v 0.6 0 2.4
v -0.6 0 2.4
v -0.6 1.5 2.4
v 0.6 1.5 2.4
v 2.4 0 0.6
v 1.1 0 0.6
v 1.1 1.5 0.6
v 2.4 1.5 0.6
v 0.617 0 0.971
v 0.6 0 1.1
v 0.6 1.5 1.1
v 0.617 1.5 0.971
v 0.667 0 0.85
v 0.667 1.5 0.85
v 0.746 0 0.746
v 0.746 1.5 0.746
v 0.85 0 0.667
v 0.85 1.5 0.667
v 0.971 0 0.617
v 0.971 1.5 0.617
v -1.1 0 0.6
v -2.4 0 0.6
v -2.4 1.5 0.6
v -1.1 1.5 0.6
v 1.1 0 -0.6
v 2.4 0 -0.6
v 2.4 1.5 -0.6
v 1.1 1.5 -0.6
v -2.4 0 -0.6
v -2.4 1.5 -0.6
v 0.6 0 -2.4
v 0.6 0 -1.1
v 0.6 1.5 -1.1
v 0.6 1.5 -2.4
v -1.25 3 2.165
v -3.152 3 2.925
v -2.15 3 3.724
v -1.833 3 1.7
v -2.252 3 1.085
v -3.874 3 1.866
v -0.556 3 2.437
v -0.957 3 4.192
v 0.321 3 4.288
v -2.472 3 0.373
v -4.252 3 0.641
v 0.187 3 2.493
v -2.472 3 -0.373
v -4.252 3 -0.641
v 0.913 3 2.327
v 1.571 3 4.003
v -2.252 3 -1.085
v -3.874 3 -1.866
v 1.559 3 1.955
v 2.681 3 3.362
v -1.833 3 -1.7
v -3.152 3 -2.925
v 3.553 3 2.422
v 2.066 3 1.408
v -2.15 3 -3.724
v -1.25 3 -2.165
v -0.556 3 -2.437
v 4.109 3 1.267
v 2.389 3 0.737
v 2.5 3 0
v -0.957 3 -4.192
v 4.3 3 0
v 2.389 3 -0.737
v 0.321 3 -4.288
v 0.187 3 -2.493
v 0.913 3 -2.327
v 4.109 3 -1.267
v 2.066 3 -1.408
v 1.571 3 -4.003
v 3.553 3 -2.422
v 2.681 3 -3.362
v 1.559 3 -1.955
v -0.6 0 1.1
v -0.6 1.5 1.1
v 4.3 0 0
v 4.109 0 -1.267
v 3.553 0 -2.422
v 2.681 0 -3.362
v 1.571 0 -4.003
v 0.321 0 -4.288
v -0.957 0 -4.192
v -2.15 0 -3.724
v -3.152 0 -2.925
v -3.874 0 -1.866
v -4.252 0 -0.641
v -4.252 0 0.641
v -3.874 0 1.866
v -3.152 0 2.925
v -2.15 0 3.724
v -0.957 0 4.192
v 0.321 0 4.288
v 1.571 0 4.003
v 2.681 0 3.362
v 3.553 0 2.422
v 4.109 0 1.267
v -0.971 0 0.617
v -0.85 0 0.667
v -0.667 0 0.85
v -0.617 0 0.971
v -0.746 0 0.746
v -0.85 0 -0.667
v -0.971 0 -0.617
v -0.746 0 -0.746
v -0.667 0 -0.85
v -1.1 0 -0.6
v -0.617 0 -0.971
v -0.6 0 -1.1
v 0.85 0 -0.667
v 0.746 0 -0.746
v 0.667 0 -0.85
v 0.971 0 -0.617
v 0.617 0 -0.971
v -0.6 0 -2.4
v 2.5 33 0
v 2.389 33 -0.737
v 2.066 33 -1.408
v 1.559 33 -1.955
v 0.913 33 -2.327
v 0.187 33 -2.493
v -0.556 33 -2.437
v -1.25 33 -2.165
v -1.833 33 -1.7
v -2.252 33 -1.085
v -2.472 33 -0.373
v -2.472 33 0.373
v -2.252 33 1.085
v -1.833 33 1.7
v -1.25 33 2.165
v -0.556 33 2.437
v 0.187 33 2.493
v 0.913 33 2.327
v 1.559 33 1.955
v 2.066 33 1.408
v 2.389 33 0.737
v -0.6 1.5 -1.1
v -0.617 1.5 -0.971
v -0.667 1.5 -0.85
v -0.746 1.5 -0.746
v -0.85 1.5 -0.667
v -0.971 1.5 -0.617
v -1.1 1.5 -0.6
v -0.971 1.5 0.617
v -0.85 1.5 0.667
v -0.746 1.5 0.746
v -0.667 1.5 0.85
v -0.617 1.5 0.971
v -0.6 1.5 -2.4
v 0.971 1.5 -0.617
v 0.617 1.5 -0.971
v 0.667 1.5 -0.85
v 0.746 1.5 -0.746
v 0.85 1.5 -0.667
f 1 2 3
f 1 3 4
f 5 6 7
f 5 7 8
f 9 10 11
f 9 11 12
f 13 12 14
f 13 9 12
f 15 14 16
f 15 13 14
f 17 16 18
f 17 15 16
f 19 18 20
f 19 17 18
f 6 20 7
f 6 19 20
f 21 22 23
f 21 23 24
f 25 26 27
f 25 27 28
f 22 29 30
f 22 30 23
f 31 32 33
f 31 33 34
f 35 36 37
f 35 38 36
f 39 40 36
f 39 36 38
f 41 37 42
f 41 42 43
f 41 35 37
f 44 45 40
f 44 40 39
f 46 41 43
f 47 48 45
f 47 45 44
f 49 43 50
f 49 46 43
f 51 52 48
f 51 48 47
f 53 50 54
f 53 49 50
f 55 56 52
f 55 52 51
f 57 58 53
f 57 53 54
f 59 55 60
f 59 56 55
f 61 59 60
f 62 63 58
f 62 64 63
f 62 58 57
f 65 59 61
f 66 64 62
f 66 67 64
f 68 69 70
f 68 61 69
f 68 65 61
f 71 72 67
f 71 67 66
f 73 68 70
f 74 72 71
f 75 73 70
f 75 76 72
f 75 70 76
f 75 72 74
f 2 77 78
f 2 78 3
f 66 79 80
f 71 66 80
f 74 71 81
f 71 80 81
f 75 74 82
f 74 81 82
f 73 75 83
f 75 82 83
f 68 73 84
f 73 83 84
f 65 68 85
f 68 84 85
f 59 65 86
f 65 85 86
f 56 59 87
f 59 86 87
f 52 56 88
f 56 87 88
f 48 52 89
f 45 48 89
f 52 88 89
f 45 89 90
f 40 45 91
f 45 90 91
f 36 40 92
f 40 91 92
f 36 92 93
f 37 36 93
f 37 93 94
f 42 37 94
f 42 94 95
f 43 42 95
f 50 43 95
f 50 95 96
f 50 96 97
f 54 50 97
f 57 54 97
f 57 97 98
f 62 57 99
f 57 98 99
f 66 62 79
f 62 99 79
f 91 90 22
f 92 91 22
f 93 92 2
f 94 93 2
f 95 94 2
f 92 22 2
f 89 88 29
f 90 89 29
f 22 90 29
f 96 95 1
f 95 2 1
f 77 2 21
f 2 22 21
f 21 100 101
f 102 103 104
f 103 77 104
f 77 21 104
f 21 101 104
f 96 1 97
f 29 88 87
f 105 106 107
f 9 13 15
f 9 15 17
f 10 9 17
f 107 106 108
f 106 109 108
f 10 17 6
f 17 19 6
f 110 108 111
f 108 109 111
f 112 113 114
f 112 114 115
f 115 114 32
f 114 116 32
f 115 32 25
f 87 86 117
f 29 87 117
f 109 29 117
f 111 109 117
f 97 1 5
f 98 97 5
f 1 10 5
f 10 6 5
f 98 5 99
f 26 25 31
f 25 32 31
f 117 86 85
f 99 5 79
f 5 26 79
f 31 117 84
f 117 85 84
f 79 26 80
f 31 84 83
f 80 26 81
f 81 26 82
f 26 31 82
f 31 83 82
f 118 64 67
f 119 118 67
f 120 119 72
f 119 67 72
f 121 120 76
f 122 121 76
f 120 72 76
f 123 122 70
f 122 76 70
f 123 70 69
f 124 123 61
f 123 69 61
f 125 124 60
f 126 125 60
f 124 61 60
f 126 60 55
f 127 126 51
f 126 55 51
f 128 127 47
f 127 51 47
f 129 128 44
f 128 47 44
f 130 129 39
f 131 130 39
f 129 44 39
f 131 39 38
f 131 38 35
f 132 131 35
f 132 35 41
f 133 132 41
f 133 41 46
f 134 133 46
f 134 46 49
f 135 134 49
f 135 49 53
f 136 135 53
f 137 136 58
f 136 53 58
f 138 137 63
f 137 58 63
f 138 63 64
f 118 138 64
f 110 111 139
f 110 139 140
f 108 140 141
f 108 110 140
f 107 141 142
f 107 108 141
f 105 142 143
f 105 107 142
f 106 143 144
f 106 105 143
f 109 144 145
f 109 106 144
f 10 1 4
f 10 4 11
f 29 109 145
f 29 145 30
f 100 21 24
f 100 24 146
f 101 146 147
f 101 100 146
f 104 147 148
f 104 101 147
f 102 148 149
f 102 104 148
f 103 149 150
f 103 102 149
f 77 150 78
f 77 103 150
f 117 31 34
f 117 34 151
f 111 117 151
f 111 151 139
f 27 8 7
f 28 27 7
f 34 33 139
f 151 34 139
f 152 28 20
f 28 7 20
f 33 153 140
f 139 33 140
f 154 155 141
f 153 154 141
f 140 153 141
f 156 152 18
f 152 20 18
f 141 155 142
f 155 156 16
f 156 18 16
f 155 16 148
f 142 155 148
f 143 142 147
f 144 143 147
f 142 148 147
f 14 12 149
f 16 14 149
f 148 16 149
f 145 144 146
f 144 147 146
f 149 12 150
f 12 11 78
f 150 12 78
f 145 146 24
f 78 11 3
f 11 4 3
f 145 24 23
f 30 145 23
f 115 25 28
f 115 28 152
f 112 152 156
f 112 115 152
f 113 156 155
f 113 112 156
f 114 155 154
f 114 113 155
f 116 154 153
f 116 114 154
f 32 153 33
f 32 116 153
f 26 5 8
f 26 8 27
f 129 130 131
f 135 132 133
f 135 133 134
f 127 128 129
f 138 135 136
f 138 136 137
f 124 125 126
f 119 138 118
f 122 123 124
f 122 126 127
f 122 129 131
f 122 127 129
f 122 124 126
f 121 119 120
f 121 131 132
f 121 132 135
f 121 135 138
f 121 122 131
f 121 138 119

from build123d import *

# Parameters (mm, degrees)
SKETCH_1_R          = 4.3
EXTRUDE_1_DEPTH     = 3
SKETCH_2_R          = 2.5
EXTRUDE_2_DEPTH     = 30
CUT_EXTRUDE_1_DEPTH = 1.5


with BuildPart() as part:
    # 草图1 → 凸台-拉伸1 (new body)
    with BuildSketch(Plane(origin=(0, 0, 0), x_dir=(1, 0, 0), z_dir=(0, 1, 0))):
        Circle(SKETCH_1_R)
    extrude(amount=EXTRUDE_1_DEPTH)

    # 草图2 → 凸台-拉伸2 (add)
    with BuildSketch(Plane(origin=(0, 3, 0), x_dir=(1, 0, 0), z_dir=(0, 1, 0))):
        Circle(SKETCH_2_R)
    extrude(amount=EXTRUDE_2_DEPTH)

    # 草图3 → 切除-拉伸1 (cut)
    with BuildSketch(Plane.XZ):
        with BuildLine():
            Line((-0.6, 1.1), (-0.6, 2.4))
            Line((-0.6, 2.4), (0.6, 2.4))
            Line((0.6, 2.4), (0.6, 1.1))
            ThreePointArc((0.6, 1.1), (0.746446609, 0.746446609), (1.1, 0.6))
            Line((1.1, 0.6), (2.4, 0.6))
            Line((2.4, 0.6), (2.4, -0.6))
            Line((2.4, -0.6), (1.1, -0.6))
            ThreePointArc((1.1, -0.6), (0.746446609, -0.746446609), (0.6, -1.1))
            Line((0.6, -1.1), (0.6, -2.4))
            Line((0.6, -2.4), (-0.6, -2.4))
            Line((-0.6, -2.4), (-0.6, -1.1))
            ThreePointArc((-0.6, -1.1), (-0.746446609, -0.746446609), (-1.1, -0.6))
            Line((-1.1, -0.6), (-2.4, -0.6))
            Line((-2.4, -0.6), (-2.4, 0.6))
            Line((-2.4, 0.6), (-1.1, 0.6))
            ThreePointArc((-1.1, 0.6), (-0.746446609, 0.746446609), (-0.6, 1.1))
        make_face()
    extrude(amount=-CUT_EXTRUDE_1_DEPTH, mode=Mode.SUBTRACT)


solid = part.part
